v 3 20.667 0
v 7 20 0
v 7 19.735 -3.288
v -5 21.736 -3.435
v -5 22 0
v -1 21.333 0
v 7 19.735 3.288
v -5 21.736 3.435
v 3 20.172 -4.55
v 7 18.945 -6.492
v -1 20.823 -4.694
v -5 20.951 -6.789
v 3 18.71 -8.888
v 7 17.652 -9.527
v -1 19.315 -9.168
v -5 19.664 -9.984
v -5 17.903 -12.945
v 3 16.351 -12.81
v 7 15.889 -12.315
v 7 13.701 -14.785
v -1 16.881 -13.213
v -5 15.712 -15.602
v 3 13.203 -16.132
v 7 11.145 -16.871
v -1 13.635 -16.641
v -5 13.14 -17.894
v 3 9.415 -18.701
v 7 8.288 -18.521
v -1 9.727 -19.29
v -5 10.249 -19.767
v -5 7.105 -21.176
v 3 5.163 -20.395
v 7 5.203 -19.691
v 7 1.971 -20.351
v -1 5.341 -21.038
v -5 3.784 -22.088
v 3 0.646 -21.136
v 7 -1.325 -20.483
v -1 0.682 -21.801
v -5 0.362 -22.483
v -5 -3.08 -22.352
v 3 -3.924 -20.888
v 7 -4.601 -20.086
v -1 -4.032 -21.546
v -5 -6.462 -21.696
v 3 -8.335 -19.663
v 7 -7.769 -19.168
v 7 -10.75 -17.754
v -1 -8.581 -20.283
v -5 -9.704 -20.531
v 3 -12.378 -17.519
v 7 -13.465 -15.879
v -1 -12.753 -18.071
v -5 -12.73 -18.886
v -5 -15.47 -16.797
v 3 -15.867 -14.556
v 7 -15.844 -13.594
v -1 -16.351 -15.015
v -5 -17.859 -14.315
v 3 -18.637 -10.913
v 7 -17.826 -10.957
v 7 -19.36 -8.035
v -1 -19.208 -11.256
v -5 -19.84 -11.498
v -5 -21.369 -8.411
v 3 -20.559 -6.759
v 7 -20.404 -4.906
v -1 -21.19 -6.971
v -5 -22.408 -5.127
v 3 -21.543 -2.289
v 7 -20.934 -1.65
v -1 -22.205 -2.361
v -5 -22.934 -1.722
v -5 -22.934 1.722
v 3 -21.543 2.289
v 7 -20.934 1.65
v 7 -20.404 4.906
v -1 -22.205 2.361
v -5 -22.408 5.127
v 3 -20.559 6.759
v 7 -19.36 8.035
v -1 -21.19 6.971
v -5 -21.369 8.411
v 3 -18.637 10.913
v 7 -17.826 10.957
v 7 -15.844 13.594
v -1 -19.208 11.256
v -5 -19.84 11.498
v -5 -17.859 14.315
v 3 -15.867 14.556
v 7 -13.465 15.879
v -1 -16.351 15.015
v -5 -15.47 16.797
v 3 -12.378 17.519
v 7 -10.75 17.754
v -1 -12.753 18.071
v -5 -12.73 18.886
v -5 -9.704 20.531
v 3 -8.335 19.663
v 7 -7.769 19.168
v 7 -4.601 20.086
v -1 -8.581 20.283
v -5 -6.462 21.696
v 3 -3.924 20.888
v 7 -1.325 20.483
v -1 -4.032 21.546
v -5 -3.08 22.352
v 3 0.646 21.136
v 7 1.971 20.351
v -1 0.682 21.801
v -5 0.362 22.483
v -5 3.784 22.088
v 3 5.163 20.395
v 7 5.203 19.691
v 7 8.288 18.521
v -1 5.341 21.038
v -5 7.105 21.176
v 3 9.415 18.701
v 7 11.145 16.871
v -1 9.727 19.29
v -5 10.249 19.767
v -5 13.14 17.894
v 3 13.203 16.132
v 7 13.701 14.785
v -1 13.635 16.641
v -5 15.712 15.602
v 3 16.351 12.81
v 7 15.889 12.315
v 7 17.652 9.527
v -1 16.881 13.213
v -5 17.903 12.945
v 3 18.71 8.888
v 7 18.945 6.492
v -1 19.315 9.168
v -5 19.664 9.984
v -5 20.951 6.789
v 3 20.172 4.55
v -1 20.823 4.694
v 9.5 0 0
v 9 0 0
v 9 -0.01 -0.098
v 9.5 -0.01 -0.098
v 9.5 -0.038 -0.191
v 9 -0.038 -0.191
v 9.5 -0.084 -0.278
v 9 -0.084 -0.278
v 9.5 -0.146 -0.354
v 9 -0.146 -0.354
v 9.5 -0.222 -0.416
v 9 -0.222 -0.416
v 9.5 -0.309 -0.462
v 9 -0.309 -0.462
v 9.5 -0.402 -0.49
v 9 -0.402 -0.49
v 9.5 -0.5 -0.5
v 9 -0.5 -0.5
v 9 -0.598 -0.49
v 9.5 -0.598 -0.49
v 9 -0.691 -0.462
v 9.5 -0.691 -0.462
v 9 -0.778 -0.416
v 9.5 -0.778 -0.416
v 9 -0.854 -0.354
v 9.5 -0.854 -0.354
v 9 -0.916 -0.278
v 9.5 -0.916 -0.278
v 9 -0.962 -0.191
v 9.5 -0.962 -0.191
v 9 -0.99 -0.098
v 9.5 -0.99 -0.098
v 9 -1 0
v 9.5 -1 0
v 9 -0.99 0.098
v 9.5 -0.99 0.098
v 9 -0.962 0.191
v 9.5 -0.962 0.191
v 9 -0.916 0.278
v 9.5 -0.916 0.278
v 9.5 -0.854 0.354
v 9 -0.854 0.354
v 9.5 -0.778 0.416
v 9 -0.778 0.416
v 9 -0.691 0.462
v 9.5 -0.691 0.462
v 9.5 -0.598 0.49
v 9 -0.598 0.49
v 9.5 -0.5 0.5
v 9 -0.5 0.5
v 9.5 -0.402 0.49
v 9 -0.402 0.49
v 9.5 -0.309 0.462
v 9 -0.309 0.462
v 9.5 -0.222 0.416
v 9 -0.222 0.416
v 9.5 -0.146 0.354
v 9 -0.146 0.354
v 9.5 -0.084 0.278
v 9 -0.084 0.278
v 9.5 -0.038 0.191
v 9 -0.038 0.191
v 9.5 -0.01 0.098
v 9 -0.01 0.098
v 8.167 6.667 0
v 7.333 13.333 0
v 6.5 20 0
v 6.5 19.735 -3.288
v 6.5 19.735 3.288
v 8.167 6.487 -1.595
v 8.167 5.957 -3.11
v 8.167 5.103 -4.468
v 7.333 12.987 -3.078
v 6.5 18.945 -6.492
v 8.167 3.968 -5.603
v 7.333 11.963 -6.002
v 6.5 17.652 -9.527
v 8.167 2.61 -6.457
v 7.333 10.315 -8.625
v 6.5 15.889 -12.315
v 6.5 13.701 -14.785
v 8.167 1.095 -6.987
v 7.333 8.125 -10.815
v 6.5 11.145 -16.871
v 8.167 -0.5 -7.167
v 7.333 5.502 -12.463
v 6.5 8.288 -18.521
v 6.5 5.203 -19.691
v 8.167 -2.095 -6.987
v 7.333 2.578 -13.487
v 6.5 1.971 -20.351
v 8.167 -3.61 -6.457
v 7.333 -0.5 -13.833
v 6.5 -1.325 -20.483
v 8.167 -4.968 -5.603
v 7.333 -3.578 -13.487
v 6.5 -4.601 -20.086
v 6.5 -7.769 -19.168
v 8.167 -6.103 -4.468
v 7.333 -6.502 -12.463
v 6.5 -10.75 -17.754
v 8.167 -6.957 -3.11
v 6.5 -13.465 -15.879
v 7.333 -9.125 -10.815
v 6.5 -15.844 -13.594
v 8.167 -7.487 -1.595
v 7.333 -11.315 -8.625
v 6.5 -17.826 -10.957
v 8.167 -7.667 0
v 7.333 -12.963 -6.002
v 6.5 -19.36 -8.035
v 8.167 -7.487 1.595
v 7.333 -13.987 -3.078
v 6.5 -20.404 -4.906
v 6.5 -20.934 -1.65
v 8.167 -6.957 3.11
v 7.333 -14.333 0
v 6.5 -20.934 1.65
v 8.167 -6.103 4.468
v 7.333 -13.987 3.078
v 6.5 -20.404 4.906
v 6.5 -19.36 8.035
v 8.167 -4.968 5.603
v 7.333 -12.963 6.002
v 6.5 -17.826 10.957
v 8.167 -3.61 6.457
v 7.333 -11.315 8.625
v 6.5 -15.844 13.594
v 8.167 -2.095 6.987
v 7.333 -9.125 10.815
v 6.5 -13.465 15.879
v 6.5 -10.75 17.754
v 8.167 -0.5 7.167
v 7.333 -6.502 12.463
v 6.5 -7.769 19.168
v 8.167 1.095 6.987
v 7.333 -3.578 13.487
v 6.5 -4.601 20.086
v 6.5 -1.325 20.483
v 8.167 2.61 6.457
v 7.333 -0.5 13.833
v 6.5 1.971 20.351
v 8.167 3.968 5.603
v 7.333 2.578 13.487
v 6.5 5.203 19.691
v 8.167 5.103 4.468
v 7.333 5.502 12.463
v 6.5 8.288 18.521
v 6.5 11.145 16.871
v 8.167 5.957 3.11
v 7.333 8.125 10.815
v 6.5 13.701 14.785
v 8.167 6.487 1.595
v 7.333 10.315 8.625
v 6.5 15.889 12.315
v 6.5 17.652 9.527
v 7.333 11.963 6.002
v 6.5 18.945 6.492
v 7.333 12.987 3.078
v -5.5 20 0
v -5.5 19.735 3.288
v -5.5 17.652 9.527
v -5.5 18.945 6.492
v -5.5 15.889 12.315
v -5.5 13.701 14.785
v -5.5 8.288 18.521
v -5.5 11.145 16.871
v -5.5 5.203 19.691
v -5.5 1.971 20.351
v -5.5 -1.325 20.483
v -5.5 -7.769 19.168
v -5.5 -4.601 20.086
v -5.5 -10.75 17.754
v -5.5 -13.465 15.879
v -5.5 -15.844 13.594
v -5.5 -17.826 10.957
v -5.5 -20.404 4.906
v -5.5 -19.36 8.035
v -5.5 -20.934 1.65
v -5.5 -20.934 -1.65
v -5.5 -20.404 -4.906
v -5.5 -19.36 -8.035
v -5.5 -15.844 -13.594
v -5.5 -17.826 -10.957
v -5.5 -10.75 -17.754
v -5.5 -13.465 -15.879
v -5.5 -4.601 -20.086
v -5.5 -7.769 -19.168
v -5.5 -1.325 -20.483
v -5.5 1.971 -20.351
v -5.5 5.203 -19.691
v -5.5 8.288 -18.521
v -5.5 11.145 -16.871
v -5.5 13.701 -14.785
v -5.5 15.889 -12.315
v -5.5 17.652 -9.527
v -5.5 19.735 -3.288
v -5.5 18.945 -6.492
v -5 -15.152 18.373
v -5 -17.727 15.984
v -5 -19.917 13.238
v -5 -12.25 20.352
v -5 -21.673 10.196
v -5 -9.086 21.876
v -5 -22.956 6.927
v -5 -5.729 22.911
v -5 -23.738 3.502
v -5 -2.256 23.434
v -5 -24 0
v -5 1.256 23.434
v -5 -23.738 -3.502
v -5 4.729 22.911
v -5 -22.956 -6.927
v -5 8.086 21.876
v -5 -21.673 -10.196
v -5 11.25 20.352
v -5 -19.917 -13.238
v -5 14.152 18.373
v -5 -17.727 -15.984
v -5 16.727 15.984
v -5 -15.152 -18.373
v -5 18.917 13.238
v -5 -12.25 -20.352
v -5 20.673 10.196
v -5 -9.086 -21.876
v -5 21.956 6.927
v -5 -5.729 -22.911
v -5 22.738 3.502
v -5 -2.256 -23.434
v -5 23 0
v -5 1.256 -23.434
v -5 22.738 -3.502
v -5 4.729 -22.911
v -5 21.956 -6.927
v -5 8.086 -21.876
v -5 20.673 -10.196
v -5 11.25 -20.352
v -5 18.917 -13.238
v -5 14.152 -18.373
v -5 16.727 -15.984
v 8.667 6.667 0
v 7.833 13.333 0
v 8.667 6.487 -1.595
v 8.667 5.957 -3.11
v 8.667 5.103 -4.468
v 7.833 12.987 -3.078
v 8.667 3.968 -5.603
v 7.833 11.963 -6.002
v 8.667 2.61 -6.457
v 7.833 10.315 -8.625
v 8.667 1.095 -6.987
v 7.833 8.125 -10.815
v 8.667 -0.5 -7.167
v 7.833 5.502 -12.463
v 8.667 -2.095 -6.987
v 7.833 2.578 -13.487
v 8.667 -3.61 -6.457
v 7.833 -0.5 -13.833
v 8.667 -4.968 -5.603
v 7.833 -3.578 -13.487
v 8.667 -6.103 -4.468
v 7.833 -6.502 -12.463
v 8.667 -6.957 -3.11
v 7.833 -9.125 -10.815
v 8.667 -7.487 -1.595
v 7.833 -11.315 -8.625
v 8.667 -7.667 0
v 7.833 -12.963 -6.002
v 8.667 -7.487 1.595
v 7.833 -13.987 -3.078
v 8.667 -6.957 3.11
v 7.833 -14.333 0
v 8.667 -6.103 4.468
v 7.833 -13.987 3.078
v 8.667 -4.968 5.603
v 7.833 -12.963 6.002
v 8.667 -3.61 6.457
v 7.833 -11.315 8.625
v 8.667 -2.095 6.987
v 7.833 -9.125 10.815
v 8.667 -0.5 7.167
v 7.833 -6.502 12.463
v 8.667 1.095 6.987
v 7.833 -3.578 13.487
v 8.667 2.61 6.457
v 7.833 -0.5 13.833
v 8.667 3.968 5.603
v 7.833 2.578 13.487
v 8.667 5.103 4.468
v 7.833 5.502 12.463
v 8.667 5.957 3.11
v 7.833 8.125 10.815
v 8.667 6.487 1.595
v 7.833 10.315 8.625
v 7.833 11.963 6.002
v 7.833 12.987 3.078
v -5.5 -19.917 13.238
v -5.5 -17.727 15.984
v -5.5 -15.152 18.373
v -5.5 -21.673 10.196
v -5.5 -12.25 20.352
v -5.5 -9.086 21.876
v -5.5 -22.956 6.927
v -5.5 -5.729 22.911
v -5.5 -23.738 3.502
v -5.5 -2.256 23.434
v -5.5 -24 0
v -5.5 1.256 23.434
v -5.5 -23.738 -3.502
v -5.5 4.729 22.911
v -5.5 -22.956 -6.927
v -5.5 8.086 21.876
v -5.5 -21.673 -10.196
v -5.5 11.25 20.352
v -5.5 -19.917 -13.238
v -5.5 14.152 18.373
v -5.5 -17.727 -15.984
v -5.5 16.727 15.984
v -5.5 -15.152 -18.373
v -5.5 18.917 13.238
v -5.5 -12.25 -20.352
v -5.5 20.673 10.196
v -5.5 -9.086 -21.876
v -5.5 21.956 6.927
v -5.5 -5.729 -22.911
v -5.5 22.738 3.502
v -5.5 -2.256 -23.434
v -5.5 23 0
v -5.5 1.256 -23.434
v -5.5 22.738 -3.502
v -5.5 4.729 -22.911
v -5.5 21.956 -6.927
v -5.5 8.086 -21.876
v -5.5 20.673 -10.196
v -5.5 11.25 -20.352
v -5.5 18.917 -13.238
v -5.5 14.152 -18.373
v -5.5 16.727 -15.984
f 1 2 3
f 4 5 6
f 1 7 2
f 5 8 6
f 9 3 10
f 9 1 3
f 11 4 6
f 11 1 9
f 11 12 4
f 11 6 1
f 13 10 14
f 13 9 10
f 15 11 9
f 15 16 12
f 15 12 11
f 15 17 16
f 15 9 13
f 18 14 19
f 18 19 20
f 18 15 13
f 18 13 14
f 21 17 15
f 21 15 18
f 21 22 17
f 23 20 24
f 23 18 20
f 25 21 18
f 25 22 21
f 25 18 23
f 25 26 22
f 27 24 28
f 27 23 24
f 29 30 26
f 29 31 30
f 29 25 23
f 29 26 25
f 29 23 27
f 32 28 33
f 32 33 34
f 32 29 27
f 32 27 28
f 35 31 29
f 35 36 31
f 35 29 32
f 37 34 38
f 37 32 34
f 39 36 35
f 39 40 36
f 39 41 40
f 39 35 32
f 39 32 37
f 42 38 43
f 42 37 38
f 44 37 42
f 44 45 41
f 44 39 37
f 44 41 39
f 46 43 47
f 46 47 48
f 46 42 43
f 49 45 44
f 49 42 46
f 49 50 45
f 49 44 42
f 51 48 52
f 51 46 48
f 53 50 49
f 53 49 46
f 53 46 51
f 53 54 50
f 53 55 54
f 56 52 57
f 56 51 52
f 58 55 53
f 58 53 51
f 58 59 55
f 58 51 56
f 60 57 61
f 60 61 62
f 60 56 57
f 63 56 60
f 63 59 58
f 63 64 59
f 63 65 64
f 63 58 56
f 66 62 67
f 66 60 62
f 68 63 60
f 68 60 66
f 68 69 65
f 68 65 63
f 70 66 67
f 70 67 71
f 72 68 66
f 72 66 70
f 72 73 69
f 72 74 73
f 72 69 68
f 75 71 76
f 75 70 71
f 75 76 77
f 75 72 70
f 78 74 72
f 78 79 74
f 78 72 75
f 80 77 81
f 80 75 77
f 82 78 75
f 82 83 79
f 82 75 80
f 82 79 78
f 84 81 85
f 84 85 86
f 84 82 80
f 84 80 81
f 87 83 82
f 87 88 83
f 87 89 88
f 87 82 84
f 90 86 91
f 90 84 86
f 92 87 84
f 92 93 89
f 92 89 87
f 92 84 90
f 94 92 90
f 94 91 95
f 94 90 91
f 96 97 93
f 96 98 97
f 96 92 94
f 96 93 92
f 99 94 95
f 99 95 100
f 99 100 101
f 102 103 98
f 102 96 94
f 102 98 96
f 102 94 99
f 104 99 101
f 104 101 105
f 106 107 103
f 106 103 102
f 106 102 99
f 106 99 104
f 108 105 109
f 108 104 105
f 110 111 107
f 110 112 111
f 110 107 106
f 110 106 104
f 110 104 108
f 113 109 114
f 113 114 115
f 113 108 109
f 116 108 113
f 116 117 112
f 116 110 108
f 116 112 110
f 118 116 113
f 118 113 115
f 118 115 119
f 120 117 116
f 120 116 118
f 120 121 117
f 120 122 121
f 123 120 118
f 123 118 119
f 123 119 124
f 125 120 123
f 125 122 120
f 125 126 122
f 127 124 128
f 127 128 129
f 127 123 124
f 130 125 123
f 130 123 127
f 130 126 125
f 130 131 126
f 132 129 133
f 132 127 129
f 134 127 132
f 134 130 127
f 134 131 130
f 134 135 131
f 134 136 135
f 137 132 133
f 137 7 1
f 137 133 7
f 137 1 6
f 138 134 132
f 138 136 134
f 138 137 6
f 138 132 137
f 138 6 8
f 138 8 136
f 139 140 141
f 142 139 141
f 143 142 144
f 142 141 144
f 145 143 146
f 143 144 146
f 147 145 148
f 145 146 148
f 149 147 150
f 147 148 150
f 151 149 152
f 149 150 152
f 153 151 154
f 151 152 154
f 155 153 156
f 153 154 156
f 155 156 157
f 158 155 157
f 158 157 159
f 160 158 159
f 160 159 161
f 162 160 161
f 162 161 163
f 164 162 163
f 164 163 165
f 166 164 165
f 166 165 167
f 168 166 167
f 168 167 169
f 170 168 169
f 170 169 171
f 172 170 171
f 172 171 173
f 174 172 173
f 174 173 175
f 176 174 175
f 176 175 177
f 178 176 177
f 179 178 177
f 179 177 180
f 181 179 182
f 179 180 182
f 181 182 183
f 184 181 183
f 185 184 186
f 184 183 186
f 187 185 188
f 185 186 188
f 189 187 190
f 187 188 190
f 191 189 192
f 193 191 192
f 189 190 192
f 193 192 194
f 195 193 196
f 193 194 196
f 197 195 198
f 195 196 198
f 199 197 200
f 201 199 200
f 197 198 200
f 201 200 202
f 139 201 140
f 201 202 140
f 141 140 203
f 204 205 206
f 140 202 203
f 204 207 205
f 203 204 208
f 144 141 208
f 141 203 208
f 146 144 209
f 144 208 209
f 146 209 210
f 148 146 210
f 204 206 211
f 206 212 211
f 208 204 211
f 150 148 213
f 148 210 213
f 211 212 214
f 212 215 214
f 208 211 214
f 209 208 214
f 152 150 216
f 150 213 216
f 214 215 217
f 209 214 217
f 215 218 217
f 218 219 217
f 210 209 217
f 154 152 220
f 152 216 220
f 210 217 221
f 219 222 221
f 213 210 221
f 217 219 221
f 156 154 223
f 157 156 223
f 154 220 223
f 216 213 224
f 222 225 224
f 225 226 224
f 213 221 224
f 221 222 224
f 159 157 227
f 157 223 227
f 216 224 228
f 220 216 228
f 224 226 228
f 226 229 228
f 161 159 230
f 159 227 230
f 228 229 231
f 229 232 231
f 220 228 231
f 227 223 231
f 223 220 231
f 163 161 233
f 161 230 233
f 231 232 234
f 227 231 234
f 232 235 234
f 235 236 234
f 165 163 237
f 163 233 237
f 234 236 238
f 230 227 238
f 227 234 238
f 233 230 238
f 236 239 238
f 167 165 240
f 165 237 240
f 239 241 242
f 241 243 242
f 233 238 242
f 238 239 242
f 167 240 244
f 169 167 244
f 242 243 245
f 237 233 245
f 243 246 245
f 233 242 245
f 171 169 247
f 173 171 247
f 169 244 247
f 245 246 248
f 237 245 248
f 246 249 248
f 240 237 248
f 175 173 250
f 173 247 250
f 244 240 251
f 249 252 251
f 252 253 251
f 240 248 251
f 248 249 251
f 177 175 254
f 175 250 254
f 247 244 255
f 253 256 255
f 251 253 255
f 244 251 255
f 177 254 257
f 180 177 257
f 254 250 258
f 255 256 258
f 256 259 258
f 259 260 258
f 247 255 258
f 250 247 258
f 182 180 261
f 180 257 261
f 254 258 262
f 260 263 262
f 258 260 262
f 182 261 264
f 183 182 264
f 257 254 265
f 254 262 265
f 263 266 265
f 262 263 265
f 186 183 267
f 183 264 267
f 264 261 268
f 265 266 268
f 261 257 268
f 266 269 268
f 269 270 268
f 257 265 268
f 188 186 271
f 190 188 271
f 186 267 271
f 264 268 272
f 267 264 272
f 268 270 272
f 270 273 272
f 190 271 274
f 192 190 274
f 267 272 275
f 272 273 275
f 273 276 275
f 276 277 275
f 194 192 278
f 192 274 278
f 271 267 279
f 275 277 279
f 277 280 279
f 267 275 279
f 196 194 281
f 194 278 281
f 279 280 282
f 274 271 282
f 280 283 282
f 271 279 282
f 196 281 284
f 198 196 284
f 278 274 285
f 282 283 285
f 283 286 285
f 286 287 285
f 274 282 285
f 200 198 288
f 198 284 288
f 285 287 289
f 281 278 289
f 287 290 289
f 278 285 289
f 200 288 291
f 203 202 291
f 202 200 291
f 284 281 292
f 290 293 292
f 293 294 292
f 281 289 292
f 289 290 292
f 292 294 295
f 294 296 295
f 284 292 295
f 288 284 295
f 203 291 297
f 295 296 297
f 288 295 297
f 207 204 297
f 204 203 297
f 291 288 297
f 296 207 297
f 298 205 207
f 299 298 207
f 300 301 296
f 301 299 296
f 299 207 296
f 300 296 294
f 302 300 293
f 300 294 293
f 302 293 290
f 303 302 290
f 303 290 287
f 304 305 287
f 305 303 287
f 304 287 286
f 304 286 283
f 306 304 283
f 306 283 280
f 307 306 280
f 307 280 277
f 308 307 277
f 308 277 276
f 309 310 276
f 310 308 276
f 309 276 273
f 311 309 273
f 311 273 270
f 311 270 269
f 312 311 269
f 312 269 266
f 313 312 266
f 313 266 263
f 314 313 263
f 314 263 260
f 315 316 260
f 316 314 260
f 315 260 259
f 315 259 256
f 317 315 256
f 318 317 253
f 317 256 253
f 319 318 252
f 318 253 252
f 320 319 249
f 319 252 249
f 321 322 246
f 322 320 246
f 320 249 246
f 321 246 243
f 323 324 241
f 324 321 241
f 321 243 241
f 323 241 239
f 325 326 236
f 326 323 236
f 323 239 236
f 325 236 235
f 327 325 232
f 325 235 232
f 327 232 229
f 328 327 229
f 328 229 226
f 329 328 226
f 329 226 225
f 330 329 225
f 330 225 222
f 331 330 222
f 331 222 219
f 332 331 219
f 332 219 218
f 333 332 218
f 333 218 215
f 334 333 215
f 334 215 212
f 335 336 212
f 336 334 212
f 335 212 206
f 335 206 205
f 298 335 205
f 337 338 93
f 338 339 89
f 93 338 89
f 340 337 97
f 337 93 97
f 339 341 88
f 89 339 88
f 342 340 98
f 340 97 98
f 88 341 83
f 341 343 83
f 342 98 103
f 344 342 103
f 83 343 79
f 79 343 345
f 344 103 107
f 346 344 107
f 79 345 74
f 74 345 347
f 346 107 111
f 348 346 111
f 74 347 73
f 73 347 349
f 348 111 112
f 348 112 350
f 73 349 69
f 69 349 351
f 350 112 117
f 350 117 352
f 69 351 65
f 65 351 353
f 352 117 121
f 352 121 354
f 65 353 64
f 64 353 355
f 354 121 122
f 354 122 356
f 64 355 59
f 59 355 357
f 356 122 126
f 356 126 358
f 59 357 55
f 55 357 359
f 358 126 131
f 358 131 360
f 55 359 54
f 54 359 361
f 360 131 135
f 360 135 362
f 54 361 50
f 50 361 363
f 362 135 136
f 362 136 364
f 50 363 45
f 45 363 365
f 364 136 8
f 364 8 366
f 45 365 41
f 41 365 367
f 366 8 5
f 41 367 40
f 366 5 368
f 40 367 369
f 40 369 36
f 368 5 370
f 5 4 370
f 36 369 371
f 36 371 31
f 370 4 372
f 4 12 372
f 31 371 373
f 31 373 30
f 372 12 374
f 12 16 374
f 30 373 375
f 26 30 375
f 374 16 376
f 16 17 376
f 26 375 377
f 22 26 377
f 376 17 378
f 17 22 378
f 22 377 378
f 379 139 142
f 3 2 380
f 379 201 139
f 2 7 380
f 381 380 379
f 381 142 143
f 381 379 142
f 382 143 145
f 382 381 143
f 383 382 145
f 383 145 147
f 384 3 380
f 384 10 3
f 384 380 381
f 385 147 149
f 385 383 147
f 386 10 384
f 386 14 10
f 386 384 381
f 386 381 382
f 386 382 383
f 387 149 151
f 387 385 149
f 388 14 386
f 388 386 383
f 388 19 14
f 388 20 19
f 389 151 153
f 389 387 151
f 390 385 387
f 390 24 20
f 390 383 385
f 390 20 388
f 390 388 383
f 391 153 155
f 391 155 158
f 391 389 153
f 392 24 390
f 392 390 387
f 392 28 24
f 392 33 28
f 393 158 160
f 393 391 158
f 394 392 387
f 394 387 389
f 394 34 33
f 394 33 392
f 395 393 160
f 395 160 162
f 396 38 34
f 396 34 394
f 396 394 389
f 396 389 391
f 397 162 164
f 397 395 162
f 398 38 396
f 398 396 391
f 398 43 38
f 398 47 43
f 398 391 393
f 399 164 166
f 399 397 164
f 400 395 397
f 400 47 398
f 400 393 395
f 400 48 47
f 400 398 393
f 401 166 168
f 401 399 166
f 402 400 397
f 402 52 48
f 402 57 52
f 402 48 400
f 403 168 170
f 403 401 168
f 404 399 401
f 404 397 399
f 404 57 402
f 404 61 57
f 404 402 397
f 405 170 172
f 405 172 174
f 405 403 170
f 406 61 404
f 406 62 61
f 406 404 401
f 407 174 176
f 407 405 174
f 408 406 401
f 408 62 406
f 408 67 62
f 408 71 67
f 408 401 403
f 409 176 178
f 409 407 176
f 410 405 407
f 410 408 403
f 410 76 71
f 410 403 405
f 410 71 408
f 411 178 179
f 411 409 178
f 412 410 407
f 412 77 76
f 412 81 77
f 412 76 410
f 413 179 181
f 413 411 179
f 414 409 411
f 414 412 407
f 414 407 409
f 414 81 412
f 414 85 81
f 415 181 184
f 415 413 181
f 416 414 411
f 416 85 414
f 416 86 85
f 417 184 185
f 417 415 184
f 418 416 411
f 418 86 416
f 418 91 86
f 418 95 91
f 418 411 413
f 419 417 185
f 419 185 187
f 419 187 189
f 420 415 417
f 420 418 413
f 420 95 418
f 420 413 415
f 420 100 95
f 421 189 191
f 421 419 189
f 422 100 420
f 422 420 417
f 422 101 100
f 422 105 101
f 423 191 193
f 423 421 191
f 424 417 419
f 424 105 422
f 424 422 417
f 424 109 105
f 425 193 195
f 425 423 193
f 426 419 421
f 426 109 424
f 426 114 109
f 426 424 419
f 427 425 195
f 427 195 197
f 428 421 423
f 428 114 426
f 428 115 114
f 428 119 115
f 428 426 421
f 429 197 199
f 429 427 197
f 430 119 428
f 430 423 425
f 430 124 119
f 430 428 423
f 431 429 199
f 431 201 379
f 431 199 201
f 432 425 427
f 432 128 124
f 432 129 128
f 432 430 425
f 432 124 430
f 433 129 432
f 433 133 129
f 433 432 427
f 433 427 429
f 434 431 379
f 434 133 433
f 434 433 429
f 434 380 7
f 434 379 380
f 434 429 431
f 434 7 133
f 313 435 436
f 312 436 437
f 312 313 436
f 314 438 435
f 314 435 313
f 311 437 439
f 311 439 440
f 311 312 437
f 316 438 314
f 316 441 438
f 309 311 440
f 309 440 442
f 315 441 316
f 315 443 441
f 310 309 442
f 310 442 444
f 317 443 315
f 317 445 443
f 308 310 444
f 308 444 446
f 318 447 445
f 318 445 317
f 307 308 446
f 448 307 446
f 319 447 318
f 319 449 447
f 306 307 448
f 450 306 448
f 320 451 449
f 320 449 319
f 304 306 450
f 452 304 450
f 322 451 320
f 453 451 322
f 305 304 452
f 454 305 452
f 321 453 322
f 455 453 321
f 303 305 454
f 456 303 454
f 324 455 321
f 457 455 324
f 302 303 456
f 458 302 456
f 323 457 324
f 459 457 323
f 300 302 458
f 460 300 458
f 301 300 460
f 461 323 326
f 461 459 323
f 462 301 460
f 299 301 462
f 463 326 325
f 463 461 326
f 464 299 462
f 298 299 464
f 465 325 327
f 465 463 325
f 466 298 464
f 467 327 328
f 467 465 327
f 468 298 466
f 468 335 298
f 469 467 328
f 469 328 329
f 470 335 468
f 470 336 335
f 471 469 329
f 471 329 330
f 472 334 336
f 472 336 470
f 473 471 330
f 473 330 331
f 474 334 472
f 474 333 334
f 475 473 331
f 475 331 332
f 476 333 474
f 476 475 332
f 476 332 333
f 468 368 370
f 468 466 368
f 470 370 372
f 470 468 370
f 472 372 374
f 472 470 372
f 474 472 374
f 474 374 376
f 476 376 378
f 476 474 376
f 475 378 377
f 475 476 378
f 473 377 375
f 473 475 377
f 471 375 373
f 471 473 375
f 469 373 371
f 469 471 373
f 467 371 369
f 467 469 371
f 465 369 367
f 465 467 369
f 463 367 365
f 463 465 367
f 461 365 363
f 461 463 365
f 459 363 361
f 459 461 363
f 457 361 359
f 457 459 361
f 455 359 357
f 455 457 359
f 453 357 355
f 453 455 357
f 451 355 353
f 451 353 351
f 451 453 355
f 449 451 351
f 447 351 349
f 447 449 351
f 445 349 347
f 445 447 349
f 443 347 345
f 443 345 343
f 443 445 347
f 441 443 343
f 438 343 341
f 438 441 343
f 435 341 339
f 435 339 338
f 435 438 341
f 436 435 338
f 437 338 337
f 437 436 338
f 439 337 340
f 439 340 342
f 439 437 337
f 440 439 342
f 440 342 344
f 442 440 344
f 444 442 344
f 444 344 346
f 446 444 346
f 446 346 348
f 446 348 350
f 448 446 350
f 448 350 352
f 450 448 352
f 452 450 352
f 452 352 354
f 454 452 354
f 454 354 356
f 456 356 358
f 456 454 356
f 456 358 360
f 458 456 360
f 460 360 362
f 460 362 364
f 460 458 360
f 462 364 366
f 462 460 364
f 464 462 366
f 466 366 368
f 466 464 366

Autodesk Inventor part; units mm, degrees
ref_plane "YZ Plane" through (0, 0, 0) normal (1, 0, 0) x (0, 1, 0)
ref_plane "XZ Plane" through (0, 0, 0) normal (0, 1, 0) x (-1, 0, 0)
ref_plane "XY Plane" through (0, 0, 0) normal (0, 0, 1) x (1, 0, 0)
sketch "Sketch1" plane through (0, 0, 0) normal (0, 0, 1) x (1, 0, 0)
  line L0 (13.5963, 0) -> (13.5963, -0.5)
  line L1 (13.5963, -0.5) -> (0, -0.5)
  line L2 (13, 0) -> (13.5963, 0)
  line L3 (-5.5, 23.9002) -> (9.5, 23.9002)
  line L4 (-5.5, 20) -> (-5.5, 22)
  line L5 (-5.5, 22) -> (-5, 22)
  line L6 (-5.5, 22) -> (-5, 22)
  line L7 (-5, 22) -> (-5, 23)
  line L8 (-5, 23) -> (-5.5, 23)
  line L9 (-5.5, 23) -> (-5.5, 22)
  line L10 (13.5963, 0) -> (13.5963, 20)
  line L11 (8.1189, -3.8338) -> (31.713, -3.8338) construction
  line L12 (-5.5, 20) -> (6.5, 20)
  line L13 (9.5, 0) -> (9, 0)
  line L14 (9, 0) -> (6.5, 20)
  line L15 (6.5, 20) -> (7, 20)
  line L16 (7, 20) -> (9.5, 0)
  line L17 (-5, 22) -> (7, 20)
  dimension "d7" = 15
  dimension "d11" = 2
  dimension "d12" = 0.5
  dimension "d13" = 1
  dimension "d17" = 20
  dimension "d19" = 12
  dimension "d20" = 0.5
  dimension "d21" = 0.5
revolve "Revolution1" add sketch "Sketch1" angle 360 about axis through (13.5963, -0.5, 0) along (-1, 0, 0)
properties part number "kab"
